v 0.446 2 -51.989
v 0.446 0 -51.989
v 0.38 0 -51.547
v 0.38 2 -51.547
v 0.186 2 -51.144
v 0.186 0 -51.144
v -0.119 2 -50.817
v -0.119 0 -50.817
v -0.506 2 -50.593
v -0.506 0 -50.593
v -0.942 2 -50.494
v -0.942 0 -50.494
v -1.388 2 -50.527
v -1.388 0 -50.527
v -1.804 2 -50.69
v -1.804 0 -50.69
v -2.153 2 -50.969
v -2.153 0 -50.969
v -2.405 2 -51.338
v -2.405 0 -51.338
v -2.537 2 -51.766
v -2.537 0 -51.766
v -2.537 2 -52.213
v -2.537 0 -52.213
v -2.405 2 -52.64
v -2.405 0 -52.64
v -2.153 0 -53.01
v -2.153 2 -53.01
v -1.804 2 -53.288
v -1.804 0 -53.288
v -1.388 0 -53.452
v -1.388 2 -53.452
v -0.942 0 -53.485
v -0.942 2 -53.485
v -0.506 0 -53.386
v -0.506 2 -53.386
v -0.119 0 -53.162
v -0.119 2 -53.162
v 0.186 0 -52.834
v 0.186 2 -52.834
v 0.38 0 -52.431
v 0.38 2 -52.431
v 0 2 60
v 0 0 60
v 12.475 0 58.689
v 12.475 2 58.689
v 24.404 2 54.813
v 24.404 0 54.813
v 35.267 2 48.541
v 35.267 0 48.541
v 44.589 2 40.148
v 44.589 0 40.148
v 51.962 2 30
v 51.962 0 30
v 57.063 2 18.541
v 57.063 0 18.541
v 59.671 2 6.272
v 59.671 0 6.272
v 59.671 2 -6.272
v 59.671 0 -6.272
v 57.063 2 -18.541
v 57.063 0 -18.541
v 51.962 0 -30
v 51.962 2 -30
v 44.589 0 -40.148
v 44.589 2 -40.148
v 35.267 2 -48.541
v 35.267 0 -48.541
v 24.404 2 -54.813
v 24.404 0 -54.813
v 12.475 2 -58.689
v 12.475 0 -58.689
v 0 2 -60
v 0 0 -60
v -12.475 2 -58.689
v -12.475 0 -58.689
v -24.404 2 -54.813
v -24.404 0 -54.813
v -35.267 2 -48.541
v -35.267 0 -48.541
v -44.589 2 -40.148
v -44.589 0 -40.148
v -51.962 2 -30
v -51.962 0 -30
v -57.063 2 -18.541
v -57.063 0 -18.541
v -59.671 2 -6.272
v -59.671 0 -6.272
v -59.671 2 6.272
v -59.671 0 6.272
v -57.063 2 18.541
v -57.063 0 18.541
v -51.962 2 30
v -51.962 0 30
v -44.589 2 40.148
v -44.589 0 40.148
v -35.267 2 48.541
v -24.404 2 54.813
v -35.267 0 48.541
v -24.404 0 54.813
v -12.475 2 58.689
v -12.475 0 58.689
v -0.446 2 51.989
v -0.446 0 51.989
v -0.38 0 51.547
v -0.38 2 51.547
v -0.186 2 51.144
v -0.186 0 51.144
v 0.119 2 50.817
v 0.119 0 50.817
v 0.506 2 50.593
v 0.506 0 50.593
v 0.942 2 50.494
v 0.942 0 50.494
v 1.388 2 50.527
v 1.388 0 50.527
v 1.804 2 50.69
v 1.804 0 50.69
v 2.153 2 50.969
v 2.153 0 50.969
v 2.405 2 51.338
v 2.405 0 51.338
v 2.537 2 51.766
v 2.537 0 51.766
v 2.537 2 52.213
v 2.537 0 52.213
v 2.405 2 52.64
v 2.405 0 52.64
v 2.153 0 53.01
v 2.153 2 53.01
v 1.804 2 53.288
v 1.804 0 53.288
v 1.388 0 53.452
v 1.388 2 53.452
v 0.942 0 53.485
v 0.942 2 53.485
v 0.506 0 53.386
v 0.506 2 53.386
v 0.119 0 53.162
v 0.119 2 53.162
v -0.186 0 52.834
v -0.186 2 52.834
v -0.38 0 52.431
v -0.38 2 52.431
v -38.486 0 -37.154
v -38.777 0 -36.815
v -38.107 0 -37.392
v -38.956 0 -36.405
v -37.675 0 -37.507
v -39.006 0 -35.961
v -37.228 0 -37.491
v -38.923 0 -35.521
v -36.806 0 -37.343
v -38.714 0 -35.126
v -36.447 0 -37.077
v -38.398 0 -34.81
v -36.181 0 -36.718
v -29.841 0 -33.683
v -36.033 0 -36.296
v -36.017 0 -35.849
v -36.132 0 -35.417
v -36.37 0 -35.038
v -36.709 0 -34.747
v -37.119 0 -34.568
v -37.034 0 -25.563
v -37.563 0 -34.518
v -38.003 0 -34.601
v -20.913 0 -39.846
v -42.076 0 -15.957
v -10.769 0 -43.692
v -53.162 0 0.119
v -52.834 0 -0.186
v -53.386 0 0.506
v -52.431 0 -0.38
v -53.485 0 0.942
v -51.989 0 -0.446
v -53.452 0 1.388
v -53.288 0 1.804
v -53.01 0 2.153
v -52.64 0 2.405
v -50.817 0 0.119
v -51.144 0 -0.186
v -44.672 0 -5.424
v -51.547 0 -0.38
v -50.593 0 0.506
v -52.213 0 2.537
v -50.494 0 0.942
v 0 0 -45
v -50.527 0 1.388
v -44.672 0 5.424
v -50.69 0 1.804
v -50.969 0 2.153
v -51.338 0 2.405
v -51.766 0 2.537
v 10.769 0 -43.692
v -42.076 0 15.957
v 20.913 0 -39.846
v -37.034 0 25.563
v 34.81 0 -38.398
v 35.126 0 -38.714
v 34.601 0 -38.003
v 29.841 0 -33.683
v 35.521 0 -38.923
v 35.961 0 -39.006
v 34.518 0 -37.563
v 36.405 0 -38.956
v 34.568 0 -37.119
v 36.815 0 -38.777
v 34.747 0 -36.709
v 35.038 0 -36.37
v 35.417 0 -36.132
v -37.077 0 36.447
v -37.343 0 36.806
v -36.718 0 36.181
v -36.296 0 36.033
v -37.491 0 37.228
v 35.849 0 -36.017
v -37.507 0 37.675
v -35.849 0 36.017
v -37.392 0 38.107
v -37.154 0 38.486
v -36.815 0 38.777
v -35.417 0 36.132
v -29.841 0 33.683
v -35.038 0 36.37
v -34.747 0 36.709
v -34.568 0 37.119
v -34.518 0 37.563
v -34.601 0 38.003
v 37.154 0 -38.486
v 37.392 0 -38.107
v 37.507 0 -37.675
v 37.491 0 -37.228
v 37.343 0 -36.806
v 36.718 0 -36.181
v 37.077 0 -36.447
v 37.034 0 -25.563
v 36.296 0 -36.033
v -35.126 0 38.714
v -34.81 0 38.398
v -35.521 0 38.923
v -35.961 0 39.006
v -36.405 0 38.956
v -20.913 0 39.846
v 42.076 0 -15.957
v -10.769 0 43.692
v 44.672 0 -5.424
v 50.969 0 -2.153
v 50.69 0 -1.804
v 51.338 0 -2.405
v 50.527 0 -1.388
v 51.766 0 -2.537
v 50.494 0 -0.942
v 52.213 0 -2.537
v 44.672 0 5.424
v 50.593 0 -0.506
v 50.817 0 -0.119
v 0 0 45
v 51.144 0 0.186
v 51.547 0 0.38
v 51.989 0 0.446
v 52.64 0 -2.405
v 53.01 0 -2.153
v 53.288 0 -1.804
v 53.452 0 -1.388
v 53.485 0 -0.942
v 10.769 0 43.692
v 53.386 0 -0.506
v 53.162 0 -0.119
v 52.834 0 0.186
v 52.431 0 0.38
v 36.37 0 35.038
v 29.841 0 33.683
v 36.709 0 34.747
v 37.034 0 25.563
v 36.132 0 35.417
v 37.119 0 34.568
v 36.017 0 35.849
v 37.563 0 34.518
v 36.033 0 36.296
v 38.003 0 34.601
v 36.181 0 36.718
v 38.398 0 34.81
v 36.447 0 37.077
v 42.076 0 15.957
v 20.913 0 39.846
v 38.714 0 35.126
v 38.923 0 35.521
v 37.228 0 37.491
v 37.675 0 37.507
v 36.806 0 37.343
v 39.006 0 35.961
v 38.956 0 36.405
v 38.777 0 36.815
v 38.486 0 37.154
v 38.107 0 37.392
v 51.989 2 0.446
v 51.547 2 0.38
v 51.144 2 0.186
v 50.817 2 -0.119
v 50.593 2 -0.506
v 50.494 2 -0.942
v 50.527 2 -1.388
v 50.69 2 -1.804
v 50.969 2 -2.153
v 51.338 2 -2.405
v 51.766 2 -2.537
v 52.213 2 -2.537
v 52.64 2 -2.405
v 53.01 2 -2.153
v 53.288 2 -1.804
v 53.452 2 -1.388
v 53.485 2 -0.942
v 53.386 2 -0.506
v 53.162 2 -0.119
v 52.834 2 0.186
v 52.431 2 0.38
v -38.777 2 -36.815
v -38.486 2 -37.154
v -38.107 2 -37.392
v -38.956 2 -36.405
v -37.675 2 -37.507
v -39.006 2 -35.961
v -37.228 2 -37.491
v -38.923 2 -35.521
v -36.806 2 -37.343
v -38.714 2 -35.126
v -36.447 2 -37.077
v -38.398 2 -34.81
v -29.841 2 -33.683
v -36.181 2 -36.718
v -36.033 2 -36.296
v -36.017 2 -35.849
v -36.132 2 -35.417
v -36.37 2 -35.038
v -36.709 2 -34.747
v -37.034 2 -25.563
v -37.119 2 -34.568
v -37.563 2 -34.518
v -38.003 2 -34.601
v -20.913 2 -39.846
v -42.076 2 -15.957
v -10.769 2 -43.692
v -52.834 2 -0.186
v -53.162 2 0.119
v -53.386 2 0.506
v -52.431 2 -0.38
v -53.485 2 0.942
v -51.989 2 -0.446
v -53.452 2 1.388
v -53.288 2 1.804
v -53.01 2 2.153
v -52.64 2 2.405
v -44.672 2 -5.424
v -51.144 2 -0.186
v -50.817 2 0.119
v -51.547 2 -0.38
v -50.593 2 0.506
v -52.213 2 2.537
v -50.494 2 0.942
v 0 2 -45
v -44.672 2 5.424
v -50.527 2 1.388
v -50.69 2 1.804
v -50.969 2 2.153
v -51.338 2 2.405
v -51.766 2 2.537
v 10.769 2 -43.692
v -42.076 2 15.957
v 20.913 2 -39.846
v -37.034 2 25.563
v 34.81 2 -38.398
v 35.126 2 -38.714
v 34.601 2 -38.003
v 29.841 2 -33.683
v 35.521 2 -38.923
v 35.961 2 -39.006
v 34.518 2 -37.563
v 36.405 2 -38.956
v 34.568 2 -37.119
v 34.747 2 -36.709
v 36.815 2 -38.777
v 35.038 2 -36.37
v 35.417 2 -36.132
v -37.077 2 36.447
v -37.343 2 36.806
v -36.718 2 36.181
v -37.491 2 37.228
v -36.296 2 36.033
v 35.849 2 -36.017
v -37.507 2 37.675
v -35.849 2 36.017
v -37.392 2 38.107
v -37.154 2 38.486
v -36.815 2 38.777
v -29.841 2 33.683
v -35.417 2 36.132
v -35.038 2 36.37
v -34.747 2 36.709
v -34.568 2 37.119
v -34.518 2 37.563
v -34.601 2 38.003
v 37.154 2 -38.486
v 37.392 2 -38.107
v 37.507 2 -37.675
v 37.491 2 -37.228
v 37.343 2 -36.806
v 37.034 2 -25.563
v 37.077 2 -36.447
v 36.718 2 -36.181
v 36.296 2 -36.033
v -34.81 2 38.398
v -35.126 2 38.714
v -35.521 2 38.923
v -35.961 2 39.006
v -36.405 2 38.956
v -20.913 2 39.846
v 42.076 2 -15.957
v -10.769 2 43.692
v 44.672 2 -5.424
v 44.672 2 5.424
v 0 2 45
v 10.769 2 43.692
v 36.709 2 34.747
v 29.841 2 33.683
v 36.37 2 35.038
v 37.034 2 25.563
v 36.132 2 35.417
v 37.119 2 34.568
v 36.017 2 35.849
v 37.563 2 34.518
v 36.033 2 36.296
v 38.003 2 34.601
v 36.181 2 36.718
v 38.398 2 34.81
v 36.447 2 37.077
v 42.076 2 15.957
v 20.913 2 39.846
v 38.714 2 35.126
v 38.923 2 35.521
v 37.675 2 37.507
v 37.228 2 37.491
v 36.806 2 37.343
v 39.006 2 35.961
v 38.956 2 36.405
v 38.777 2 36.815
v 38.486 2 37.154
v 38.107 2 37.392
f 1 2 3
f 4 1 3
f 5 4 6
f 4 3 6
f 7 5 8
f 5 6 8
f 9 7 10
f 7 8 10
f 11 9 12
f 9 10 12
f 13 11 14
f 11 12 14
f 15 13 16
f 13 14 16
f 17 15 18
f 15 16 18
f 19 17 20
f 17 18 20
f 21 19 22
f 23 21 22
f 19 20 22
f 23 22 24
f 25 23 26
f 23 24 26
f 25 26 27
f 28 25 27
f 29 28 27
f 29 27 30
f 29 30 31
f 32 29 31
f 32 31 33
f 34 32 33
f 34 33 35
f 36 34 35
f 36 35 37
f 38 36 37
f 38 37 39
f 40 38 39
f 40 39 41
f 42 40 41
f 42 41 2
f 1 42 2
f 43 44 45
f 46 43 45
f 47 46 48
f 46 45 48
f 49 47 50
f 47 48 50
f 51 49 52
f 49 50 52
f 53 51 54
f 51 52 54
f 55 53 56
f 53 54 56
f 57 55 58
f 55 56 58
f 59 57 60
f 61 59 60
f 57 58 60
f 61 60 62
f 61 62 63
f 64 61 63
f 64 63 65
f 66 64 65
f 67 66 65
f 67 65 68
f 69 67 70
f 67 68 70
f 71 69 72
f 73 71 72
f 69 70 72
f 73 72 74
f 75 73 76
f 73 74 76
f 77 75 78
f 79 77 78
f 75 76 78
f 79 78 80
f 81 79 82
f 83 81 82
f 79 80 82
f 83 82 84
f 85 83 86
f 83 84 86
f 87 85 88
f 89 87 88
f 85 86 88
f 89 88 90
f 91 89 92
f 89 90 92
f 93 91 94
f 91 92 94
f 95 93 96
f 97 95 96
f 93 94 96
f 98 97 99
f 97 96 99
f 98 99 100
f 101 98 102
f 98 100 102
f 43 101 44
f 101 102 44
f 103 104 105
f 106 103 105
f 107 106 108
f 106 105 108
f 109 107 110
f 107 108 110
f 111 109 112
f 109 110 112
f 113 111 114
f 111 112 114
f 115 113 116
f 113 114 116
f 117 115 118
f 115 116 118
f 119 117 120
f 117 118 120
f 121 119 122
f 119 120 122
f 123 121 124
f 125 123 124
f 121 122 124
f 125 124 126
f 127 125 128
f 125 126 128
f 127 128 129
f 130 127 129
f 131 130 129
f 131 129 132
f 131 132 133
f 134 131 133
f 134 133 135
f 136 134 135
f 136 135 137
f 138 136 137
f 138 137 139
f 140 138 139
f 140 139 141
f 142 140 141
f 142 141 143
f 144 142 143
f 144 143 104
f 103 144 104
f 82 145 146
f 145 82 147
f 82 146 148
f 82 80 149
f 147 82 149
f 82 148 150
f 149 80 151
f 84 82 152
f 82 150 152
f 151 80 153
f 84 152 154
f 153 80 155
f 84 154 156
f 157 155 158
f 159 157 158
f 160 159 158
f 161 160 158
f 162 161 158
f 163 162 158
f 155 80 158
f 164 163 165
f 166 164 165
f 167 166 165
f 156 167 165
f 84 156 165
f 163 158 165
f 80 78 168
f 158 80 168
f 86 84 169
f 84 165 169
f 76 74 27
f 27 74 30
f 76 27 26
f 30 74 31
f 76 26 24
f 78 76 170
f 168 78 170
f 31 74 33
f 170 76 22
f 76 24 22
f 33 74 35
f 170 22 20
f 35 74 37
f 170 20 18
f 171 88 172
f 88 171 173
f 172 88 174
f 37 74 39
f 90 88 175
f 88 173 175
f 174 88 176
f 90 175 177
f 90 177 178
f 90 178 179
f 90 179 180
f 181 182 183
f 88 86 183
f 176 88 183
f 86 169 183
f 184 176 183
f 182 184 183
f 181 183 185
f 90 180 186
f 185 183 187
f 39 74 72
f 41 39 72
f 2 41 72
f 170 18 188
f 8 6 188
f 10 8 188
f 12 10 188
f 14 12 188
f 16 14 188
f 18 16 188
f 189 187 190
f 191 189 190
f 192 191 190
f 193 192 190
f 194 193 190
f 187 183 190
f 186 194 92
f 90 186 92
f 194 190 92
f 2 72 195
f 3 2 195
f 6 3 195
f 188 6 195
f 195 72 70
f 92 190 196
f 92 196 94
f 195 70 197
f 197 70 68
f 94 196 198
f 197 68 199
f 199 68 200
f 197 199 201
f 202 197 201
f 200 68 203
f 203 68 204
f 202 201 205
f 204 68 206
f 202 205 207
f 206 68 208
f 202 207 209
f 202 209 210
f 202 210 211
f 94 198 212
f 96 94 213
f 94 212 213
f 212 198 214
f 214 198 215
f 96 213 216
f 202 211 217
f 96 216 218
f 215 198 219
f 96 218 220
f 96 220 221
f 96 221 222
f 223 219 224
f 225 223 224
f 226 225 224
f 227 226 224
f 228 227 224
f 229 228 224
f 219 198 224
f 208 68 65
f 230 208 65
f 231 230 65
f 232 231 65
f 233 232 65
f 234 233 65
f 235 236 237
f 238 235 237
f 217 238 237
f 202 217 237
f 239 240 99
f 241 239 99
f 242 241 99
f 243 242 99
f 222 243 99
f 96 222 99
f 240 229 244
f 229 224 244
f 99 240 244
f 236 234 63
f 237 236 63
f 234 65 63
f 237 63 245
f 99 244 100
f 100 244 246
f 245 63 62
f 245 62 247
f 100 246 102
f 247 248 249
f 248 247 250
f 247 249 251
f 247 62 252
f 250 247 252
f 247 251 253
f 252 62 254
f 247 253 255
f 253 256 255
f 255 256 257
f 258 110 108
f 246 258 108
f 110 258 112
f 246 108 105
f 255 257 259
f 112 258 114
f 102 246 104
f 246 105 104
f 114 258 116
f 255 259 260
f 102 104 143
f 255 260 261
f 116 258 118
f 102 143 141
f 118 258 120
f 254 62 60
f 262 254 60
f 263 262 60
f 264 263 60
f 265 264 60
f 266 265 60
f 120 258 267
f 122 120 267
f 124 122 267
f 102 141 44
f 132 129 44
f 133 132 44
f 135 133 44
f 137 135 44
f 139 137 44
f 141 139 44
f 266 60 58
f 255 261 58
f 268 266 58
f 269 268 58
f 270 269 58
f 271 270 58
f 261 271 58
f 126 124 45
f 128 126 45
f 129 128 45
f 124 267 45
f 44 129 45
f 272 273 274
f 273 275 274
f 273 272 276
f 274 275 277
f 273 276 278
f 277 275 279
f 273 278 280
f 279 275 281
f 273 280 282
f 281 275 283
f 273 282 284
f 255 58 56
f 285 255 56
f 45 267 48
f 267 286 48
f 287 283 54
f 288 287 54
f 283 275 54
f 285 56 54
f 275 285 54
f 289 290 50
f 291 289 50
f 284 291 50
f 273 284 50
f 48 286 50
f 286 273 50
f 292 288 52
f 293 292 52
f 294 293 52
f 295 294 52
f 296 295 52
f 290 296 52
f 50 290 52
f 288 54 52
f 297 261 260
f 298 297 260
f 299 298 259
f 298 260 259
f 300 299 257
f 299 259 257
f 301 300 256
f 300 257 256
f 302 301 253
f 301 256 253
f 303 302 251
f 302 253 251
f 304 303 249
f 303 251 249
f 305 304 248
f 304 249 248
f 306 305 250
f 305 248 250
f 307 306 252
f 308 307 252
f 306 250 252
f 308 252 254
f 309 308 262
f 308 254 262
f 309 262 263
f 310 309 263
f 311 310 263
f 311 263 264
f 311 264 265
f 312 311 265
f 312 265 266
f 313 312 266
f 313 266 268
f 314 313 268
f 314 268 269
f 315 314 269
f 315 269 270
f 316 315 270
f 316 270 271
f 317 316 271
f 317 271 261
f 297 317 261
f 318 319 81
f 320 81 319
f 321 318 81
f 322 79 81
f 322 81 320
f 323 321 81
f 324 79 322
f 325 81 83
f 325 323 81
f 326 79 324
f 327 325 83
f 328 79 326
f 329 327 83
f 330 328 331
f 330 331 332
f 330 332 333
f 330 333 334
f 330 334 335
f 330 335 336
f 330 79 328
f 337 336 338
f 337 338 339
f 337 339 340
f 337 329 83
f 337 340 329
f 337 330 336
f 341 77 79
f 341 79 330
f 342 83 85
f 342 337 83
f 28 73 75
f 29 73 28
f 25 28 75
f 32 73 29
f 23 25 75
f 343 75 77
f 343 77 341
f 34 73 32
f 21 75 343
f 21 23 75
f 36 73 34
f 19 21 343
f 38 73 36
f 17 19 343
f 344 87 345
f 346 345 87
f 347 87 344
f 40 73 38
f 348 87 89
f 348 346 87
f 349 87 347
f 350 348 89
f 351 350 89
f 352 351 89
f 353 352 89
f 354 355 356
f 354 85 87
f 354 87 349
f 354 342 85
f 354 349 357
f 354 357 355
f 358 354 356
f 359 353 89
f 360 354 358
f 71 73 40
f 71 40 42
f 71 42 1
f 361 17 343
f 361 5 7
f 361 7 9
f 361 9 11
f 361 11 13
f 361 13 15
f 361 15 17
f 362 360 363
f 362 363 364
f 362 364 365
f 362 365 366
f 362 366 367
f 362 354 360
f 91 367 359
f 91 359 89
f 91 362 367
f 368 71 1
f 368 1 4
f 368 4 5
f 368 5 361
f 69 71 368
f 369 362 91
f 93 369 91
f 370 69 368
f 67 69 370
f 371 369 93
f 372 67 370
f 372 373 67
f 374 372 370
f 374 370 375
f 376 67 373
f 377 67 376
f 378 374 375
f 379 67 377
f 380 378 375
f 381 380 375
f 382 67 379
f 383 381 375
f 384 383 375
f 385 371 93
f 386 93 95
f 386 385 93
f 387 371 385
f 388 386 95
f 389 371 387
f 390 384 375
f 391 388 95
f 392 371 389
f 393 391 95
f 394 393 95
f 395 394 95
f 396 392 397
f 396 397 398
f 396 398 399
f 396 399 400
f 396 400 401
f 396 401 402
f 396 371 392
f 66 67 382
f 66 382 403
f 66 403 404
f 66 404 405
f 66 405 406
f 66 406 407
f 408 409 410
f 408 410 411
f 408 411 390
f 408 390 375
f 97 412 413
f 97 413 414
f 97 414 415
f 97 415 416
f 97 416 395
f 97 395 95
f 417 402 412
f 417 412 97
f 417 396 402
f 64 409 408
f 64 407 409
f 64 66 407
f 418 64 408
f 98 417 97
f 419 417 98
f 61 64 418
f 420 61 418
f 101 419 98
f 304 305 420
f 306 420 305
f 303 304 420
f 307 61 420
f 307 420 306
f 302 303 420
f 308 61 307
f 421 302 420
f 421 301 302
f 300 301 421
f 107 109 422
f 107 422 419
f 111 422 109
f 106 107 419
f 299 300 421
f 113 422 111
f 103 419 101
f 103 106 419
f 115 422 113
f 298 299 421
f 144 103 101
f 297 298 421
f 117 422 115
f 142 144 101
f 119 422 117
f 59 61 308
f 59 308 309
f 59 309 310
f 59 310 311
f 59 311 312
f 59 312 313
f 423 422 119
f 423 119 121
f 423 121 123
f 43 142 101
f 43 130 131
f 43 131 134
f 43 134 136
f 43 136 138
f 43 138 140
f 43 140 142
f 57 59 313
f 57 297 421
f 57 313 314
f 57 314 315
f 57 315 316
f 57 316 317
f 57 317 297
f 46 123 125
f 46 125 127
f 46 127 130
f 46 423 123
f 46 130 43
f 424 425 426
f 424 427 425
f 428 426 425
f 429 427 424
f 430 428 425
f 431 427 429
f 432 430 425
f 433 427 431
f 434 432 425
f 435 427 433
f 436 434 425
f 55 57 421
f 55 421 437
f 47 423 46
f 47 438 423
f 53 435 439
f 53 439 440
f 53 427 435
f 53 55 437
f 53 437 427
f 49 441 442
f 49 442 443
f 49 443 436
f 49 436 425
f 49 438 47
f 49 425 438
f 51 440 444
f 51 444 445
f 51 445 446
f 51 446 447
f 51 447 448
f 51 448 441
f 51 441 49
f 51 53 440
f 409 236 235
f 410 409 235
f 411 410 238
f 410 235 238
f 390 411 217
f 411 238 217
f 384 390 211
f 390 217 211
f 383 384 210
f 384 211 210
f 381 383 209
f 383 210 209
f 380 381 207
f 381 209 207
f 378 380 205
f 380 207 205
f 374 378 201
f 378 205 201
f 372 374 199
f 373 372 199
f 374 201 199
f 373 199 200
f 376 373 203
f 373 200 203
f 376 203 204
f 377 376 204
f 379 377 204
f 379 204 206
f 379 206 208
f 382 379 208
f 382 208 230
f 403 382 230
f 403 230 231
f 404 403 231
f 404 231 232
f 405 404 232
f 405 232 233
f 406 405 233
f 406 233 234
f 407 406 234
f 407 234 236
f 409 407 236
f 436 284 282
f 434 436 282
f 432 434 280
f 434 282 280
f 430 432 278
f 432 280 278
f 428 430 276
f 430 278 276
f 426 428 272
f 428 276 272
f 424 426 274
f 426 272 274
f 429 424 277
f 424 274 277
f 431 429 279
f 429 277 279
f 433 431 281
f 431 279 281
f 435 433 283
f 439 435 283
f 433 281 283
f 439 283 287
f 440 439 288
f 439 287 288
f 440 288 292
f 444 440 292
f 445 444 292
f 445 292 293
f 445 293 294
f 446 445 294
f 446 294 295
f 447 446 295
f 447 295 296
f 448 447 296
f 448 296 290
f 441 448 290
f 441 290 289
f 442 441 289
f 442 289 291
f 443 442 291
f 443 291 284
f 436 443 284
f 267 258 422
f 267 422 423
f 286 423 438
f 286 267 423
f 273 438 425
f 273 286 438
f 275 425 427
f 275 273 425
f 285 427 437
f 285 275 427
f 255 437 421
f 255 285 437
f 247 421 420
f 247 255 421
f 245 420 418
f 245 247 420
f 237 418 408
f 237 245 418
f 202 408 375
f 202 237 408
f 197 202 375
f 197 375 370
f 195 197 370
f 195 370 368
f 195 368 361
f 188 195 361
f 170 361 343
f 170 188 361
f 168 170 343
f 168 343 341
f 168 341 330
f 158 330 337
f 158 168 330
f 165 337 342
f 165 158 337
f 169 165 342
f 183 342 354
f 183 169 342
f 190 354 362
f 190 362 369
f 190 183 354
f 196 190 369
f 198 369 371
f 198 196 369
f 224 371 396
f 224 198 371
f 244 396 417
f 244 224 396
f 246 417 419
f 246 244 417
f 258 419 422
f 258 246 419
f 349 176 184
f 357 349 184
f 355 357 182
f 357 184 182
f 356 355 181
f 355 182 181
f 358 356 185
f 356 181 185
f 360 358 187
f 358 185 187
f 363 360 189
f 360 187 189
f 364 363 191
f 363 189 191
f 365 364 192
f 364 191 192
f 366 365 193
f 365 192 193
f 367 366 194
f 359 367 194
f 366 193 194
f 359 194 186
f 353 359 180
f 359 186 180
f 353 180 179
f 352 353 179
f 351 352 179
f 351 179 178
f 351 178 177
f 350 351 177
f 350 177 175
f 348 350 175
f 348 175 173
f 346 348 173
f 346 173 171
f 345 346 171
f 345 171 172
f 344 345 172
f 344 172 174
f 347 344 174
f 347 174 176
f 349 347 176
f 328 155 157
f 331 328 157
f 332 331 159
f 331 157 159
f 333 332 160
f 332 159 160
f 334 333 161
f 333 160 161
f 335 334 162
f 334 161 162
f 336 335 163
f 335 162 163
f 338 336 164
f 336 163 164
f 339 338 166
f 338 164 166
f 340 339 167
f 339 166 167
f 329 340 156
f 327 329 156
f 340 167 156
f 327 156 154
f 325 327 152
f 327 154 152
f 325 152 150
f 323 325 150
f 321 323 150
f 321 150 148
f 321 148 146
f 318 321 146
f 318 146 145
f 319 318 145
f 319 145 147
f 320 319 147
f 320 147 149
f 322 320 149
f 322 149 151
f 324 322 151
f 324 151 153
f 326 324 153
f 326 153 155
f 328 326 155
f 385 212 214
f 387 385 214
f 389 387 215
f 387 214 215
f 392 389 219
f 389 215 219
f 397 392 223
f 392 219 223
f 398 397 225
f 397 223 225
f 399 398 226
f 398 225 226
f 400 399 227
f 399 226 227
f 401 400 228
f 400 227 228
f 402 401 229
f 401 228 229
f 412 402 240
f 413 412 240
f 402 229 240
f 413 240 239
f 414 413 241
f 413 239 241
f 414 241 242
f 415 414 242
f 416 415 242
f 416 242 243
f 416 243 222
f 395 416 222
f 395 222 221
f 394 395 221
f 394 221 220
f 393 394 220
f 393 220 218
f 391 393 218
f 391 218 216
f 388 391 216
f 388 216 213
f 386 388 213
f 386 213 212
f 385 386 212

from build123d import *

# Parameters (mm, degrees)
SKETCH_1_R               = 60
SKETCH_1_R_2             = 45
EXTRUDE_1_DEPTH          = 2
SKETCH_2_R               = 1.5
CUT_EXTRUDE_1_DEPTH      = 50
PATTERN_CIRCULAR_1_COUNT = 8


with BuildPart() as part:
    # 草图1 → 凸台-拉伸1 (new body)
    with BuildSketch(Plane(origin=(0, 0, 0), x_dir=(1, 0, 0), z_dir=(0, 1, 0))):
        with Locations(Location((0, 0, 0), (0, 0, 270))):
            Circle(SKETCH_1_R)
        with Locations(Location((0, 0, 0), (0, 0, 270))):
            Circle(SKETCH_1_R_2, mode=Mode.SUBTRACT)
    extrude(amount=EXTRUDE_1_DEPTH)

    # 草图2 → 切除-拉伸1 (cut)
    with BuildSketch(Plane.XZ):
        with Locations(Location((-51.989320621, 1.053822248, 0), (0, 0, 270))):
            Circle(SKETCH_2_R)
    cut_extrude_1 = extrude(amount=-CUT_EXTRUDE_1_DEPTH, mode=Mode.SUBTRACT)

    # 阵列(圆周)1: 切除-拉伸1 ×8 about axis
    pattern_circular_1_axis = Axis((0, 0, 0), (0, 1, 0))
    for i in range(1, PATTERN_CIRCULAR_1_COUNT):
        add(cut_extrude_1.rotate(pattern_circular_1_axis, i * 360 / PATTERN_CIRCULAR_1_COUNT), mode=Mode.SUBTRACT)


solid = part.part
